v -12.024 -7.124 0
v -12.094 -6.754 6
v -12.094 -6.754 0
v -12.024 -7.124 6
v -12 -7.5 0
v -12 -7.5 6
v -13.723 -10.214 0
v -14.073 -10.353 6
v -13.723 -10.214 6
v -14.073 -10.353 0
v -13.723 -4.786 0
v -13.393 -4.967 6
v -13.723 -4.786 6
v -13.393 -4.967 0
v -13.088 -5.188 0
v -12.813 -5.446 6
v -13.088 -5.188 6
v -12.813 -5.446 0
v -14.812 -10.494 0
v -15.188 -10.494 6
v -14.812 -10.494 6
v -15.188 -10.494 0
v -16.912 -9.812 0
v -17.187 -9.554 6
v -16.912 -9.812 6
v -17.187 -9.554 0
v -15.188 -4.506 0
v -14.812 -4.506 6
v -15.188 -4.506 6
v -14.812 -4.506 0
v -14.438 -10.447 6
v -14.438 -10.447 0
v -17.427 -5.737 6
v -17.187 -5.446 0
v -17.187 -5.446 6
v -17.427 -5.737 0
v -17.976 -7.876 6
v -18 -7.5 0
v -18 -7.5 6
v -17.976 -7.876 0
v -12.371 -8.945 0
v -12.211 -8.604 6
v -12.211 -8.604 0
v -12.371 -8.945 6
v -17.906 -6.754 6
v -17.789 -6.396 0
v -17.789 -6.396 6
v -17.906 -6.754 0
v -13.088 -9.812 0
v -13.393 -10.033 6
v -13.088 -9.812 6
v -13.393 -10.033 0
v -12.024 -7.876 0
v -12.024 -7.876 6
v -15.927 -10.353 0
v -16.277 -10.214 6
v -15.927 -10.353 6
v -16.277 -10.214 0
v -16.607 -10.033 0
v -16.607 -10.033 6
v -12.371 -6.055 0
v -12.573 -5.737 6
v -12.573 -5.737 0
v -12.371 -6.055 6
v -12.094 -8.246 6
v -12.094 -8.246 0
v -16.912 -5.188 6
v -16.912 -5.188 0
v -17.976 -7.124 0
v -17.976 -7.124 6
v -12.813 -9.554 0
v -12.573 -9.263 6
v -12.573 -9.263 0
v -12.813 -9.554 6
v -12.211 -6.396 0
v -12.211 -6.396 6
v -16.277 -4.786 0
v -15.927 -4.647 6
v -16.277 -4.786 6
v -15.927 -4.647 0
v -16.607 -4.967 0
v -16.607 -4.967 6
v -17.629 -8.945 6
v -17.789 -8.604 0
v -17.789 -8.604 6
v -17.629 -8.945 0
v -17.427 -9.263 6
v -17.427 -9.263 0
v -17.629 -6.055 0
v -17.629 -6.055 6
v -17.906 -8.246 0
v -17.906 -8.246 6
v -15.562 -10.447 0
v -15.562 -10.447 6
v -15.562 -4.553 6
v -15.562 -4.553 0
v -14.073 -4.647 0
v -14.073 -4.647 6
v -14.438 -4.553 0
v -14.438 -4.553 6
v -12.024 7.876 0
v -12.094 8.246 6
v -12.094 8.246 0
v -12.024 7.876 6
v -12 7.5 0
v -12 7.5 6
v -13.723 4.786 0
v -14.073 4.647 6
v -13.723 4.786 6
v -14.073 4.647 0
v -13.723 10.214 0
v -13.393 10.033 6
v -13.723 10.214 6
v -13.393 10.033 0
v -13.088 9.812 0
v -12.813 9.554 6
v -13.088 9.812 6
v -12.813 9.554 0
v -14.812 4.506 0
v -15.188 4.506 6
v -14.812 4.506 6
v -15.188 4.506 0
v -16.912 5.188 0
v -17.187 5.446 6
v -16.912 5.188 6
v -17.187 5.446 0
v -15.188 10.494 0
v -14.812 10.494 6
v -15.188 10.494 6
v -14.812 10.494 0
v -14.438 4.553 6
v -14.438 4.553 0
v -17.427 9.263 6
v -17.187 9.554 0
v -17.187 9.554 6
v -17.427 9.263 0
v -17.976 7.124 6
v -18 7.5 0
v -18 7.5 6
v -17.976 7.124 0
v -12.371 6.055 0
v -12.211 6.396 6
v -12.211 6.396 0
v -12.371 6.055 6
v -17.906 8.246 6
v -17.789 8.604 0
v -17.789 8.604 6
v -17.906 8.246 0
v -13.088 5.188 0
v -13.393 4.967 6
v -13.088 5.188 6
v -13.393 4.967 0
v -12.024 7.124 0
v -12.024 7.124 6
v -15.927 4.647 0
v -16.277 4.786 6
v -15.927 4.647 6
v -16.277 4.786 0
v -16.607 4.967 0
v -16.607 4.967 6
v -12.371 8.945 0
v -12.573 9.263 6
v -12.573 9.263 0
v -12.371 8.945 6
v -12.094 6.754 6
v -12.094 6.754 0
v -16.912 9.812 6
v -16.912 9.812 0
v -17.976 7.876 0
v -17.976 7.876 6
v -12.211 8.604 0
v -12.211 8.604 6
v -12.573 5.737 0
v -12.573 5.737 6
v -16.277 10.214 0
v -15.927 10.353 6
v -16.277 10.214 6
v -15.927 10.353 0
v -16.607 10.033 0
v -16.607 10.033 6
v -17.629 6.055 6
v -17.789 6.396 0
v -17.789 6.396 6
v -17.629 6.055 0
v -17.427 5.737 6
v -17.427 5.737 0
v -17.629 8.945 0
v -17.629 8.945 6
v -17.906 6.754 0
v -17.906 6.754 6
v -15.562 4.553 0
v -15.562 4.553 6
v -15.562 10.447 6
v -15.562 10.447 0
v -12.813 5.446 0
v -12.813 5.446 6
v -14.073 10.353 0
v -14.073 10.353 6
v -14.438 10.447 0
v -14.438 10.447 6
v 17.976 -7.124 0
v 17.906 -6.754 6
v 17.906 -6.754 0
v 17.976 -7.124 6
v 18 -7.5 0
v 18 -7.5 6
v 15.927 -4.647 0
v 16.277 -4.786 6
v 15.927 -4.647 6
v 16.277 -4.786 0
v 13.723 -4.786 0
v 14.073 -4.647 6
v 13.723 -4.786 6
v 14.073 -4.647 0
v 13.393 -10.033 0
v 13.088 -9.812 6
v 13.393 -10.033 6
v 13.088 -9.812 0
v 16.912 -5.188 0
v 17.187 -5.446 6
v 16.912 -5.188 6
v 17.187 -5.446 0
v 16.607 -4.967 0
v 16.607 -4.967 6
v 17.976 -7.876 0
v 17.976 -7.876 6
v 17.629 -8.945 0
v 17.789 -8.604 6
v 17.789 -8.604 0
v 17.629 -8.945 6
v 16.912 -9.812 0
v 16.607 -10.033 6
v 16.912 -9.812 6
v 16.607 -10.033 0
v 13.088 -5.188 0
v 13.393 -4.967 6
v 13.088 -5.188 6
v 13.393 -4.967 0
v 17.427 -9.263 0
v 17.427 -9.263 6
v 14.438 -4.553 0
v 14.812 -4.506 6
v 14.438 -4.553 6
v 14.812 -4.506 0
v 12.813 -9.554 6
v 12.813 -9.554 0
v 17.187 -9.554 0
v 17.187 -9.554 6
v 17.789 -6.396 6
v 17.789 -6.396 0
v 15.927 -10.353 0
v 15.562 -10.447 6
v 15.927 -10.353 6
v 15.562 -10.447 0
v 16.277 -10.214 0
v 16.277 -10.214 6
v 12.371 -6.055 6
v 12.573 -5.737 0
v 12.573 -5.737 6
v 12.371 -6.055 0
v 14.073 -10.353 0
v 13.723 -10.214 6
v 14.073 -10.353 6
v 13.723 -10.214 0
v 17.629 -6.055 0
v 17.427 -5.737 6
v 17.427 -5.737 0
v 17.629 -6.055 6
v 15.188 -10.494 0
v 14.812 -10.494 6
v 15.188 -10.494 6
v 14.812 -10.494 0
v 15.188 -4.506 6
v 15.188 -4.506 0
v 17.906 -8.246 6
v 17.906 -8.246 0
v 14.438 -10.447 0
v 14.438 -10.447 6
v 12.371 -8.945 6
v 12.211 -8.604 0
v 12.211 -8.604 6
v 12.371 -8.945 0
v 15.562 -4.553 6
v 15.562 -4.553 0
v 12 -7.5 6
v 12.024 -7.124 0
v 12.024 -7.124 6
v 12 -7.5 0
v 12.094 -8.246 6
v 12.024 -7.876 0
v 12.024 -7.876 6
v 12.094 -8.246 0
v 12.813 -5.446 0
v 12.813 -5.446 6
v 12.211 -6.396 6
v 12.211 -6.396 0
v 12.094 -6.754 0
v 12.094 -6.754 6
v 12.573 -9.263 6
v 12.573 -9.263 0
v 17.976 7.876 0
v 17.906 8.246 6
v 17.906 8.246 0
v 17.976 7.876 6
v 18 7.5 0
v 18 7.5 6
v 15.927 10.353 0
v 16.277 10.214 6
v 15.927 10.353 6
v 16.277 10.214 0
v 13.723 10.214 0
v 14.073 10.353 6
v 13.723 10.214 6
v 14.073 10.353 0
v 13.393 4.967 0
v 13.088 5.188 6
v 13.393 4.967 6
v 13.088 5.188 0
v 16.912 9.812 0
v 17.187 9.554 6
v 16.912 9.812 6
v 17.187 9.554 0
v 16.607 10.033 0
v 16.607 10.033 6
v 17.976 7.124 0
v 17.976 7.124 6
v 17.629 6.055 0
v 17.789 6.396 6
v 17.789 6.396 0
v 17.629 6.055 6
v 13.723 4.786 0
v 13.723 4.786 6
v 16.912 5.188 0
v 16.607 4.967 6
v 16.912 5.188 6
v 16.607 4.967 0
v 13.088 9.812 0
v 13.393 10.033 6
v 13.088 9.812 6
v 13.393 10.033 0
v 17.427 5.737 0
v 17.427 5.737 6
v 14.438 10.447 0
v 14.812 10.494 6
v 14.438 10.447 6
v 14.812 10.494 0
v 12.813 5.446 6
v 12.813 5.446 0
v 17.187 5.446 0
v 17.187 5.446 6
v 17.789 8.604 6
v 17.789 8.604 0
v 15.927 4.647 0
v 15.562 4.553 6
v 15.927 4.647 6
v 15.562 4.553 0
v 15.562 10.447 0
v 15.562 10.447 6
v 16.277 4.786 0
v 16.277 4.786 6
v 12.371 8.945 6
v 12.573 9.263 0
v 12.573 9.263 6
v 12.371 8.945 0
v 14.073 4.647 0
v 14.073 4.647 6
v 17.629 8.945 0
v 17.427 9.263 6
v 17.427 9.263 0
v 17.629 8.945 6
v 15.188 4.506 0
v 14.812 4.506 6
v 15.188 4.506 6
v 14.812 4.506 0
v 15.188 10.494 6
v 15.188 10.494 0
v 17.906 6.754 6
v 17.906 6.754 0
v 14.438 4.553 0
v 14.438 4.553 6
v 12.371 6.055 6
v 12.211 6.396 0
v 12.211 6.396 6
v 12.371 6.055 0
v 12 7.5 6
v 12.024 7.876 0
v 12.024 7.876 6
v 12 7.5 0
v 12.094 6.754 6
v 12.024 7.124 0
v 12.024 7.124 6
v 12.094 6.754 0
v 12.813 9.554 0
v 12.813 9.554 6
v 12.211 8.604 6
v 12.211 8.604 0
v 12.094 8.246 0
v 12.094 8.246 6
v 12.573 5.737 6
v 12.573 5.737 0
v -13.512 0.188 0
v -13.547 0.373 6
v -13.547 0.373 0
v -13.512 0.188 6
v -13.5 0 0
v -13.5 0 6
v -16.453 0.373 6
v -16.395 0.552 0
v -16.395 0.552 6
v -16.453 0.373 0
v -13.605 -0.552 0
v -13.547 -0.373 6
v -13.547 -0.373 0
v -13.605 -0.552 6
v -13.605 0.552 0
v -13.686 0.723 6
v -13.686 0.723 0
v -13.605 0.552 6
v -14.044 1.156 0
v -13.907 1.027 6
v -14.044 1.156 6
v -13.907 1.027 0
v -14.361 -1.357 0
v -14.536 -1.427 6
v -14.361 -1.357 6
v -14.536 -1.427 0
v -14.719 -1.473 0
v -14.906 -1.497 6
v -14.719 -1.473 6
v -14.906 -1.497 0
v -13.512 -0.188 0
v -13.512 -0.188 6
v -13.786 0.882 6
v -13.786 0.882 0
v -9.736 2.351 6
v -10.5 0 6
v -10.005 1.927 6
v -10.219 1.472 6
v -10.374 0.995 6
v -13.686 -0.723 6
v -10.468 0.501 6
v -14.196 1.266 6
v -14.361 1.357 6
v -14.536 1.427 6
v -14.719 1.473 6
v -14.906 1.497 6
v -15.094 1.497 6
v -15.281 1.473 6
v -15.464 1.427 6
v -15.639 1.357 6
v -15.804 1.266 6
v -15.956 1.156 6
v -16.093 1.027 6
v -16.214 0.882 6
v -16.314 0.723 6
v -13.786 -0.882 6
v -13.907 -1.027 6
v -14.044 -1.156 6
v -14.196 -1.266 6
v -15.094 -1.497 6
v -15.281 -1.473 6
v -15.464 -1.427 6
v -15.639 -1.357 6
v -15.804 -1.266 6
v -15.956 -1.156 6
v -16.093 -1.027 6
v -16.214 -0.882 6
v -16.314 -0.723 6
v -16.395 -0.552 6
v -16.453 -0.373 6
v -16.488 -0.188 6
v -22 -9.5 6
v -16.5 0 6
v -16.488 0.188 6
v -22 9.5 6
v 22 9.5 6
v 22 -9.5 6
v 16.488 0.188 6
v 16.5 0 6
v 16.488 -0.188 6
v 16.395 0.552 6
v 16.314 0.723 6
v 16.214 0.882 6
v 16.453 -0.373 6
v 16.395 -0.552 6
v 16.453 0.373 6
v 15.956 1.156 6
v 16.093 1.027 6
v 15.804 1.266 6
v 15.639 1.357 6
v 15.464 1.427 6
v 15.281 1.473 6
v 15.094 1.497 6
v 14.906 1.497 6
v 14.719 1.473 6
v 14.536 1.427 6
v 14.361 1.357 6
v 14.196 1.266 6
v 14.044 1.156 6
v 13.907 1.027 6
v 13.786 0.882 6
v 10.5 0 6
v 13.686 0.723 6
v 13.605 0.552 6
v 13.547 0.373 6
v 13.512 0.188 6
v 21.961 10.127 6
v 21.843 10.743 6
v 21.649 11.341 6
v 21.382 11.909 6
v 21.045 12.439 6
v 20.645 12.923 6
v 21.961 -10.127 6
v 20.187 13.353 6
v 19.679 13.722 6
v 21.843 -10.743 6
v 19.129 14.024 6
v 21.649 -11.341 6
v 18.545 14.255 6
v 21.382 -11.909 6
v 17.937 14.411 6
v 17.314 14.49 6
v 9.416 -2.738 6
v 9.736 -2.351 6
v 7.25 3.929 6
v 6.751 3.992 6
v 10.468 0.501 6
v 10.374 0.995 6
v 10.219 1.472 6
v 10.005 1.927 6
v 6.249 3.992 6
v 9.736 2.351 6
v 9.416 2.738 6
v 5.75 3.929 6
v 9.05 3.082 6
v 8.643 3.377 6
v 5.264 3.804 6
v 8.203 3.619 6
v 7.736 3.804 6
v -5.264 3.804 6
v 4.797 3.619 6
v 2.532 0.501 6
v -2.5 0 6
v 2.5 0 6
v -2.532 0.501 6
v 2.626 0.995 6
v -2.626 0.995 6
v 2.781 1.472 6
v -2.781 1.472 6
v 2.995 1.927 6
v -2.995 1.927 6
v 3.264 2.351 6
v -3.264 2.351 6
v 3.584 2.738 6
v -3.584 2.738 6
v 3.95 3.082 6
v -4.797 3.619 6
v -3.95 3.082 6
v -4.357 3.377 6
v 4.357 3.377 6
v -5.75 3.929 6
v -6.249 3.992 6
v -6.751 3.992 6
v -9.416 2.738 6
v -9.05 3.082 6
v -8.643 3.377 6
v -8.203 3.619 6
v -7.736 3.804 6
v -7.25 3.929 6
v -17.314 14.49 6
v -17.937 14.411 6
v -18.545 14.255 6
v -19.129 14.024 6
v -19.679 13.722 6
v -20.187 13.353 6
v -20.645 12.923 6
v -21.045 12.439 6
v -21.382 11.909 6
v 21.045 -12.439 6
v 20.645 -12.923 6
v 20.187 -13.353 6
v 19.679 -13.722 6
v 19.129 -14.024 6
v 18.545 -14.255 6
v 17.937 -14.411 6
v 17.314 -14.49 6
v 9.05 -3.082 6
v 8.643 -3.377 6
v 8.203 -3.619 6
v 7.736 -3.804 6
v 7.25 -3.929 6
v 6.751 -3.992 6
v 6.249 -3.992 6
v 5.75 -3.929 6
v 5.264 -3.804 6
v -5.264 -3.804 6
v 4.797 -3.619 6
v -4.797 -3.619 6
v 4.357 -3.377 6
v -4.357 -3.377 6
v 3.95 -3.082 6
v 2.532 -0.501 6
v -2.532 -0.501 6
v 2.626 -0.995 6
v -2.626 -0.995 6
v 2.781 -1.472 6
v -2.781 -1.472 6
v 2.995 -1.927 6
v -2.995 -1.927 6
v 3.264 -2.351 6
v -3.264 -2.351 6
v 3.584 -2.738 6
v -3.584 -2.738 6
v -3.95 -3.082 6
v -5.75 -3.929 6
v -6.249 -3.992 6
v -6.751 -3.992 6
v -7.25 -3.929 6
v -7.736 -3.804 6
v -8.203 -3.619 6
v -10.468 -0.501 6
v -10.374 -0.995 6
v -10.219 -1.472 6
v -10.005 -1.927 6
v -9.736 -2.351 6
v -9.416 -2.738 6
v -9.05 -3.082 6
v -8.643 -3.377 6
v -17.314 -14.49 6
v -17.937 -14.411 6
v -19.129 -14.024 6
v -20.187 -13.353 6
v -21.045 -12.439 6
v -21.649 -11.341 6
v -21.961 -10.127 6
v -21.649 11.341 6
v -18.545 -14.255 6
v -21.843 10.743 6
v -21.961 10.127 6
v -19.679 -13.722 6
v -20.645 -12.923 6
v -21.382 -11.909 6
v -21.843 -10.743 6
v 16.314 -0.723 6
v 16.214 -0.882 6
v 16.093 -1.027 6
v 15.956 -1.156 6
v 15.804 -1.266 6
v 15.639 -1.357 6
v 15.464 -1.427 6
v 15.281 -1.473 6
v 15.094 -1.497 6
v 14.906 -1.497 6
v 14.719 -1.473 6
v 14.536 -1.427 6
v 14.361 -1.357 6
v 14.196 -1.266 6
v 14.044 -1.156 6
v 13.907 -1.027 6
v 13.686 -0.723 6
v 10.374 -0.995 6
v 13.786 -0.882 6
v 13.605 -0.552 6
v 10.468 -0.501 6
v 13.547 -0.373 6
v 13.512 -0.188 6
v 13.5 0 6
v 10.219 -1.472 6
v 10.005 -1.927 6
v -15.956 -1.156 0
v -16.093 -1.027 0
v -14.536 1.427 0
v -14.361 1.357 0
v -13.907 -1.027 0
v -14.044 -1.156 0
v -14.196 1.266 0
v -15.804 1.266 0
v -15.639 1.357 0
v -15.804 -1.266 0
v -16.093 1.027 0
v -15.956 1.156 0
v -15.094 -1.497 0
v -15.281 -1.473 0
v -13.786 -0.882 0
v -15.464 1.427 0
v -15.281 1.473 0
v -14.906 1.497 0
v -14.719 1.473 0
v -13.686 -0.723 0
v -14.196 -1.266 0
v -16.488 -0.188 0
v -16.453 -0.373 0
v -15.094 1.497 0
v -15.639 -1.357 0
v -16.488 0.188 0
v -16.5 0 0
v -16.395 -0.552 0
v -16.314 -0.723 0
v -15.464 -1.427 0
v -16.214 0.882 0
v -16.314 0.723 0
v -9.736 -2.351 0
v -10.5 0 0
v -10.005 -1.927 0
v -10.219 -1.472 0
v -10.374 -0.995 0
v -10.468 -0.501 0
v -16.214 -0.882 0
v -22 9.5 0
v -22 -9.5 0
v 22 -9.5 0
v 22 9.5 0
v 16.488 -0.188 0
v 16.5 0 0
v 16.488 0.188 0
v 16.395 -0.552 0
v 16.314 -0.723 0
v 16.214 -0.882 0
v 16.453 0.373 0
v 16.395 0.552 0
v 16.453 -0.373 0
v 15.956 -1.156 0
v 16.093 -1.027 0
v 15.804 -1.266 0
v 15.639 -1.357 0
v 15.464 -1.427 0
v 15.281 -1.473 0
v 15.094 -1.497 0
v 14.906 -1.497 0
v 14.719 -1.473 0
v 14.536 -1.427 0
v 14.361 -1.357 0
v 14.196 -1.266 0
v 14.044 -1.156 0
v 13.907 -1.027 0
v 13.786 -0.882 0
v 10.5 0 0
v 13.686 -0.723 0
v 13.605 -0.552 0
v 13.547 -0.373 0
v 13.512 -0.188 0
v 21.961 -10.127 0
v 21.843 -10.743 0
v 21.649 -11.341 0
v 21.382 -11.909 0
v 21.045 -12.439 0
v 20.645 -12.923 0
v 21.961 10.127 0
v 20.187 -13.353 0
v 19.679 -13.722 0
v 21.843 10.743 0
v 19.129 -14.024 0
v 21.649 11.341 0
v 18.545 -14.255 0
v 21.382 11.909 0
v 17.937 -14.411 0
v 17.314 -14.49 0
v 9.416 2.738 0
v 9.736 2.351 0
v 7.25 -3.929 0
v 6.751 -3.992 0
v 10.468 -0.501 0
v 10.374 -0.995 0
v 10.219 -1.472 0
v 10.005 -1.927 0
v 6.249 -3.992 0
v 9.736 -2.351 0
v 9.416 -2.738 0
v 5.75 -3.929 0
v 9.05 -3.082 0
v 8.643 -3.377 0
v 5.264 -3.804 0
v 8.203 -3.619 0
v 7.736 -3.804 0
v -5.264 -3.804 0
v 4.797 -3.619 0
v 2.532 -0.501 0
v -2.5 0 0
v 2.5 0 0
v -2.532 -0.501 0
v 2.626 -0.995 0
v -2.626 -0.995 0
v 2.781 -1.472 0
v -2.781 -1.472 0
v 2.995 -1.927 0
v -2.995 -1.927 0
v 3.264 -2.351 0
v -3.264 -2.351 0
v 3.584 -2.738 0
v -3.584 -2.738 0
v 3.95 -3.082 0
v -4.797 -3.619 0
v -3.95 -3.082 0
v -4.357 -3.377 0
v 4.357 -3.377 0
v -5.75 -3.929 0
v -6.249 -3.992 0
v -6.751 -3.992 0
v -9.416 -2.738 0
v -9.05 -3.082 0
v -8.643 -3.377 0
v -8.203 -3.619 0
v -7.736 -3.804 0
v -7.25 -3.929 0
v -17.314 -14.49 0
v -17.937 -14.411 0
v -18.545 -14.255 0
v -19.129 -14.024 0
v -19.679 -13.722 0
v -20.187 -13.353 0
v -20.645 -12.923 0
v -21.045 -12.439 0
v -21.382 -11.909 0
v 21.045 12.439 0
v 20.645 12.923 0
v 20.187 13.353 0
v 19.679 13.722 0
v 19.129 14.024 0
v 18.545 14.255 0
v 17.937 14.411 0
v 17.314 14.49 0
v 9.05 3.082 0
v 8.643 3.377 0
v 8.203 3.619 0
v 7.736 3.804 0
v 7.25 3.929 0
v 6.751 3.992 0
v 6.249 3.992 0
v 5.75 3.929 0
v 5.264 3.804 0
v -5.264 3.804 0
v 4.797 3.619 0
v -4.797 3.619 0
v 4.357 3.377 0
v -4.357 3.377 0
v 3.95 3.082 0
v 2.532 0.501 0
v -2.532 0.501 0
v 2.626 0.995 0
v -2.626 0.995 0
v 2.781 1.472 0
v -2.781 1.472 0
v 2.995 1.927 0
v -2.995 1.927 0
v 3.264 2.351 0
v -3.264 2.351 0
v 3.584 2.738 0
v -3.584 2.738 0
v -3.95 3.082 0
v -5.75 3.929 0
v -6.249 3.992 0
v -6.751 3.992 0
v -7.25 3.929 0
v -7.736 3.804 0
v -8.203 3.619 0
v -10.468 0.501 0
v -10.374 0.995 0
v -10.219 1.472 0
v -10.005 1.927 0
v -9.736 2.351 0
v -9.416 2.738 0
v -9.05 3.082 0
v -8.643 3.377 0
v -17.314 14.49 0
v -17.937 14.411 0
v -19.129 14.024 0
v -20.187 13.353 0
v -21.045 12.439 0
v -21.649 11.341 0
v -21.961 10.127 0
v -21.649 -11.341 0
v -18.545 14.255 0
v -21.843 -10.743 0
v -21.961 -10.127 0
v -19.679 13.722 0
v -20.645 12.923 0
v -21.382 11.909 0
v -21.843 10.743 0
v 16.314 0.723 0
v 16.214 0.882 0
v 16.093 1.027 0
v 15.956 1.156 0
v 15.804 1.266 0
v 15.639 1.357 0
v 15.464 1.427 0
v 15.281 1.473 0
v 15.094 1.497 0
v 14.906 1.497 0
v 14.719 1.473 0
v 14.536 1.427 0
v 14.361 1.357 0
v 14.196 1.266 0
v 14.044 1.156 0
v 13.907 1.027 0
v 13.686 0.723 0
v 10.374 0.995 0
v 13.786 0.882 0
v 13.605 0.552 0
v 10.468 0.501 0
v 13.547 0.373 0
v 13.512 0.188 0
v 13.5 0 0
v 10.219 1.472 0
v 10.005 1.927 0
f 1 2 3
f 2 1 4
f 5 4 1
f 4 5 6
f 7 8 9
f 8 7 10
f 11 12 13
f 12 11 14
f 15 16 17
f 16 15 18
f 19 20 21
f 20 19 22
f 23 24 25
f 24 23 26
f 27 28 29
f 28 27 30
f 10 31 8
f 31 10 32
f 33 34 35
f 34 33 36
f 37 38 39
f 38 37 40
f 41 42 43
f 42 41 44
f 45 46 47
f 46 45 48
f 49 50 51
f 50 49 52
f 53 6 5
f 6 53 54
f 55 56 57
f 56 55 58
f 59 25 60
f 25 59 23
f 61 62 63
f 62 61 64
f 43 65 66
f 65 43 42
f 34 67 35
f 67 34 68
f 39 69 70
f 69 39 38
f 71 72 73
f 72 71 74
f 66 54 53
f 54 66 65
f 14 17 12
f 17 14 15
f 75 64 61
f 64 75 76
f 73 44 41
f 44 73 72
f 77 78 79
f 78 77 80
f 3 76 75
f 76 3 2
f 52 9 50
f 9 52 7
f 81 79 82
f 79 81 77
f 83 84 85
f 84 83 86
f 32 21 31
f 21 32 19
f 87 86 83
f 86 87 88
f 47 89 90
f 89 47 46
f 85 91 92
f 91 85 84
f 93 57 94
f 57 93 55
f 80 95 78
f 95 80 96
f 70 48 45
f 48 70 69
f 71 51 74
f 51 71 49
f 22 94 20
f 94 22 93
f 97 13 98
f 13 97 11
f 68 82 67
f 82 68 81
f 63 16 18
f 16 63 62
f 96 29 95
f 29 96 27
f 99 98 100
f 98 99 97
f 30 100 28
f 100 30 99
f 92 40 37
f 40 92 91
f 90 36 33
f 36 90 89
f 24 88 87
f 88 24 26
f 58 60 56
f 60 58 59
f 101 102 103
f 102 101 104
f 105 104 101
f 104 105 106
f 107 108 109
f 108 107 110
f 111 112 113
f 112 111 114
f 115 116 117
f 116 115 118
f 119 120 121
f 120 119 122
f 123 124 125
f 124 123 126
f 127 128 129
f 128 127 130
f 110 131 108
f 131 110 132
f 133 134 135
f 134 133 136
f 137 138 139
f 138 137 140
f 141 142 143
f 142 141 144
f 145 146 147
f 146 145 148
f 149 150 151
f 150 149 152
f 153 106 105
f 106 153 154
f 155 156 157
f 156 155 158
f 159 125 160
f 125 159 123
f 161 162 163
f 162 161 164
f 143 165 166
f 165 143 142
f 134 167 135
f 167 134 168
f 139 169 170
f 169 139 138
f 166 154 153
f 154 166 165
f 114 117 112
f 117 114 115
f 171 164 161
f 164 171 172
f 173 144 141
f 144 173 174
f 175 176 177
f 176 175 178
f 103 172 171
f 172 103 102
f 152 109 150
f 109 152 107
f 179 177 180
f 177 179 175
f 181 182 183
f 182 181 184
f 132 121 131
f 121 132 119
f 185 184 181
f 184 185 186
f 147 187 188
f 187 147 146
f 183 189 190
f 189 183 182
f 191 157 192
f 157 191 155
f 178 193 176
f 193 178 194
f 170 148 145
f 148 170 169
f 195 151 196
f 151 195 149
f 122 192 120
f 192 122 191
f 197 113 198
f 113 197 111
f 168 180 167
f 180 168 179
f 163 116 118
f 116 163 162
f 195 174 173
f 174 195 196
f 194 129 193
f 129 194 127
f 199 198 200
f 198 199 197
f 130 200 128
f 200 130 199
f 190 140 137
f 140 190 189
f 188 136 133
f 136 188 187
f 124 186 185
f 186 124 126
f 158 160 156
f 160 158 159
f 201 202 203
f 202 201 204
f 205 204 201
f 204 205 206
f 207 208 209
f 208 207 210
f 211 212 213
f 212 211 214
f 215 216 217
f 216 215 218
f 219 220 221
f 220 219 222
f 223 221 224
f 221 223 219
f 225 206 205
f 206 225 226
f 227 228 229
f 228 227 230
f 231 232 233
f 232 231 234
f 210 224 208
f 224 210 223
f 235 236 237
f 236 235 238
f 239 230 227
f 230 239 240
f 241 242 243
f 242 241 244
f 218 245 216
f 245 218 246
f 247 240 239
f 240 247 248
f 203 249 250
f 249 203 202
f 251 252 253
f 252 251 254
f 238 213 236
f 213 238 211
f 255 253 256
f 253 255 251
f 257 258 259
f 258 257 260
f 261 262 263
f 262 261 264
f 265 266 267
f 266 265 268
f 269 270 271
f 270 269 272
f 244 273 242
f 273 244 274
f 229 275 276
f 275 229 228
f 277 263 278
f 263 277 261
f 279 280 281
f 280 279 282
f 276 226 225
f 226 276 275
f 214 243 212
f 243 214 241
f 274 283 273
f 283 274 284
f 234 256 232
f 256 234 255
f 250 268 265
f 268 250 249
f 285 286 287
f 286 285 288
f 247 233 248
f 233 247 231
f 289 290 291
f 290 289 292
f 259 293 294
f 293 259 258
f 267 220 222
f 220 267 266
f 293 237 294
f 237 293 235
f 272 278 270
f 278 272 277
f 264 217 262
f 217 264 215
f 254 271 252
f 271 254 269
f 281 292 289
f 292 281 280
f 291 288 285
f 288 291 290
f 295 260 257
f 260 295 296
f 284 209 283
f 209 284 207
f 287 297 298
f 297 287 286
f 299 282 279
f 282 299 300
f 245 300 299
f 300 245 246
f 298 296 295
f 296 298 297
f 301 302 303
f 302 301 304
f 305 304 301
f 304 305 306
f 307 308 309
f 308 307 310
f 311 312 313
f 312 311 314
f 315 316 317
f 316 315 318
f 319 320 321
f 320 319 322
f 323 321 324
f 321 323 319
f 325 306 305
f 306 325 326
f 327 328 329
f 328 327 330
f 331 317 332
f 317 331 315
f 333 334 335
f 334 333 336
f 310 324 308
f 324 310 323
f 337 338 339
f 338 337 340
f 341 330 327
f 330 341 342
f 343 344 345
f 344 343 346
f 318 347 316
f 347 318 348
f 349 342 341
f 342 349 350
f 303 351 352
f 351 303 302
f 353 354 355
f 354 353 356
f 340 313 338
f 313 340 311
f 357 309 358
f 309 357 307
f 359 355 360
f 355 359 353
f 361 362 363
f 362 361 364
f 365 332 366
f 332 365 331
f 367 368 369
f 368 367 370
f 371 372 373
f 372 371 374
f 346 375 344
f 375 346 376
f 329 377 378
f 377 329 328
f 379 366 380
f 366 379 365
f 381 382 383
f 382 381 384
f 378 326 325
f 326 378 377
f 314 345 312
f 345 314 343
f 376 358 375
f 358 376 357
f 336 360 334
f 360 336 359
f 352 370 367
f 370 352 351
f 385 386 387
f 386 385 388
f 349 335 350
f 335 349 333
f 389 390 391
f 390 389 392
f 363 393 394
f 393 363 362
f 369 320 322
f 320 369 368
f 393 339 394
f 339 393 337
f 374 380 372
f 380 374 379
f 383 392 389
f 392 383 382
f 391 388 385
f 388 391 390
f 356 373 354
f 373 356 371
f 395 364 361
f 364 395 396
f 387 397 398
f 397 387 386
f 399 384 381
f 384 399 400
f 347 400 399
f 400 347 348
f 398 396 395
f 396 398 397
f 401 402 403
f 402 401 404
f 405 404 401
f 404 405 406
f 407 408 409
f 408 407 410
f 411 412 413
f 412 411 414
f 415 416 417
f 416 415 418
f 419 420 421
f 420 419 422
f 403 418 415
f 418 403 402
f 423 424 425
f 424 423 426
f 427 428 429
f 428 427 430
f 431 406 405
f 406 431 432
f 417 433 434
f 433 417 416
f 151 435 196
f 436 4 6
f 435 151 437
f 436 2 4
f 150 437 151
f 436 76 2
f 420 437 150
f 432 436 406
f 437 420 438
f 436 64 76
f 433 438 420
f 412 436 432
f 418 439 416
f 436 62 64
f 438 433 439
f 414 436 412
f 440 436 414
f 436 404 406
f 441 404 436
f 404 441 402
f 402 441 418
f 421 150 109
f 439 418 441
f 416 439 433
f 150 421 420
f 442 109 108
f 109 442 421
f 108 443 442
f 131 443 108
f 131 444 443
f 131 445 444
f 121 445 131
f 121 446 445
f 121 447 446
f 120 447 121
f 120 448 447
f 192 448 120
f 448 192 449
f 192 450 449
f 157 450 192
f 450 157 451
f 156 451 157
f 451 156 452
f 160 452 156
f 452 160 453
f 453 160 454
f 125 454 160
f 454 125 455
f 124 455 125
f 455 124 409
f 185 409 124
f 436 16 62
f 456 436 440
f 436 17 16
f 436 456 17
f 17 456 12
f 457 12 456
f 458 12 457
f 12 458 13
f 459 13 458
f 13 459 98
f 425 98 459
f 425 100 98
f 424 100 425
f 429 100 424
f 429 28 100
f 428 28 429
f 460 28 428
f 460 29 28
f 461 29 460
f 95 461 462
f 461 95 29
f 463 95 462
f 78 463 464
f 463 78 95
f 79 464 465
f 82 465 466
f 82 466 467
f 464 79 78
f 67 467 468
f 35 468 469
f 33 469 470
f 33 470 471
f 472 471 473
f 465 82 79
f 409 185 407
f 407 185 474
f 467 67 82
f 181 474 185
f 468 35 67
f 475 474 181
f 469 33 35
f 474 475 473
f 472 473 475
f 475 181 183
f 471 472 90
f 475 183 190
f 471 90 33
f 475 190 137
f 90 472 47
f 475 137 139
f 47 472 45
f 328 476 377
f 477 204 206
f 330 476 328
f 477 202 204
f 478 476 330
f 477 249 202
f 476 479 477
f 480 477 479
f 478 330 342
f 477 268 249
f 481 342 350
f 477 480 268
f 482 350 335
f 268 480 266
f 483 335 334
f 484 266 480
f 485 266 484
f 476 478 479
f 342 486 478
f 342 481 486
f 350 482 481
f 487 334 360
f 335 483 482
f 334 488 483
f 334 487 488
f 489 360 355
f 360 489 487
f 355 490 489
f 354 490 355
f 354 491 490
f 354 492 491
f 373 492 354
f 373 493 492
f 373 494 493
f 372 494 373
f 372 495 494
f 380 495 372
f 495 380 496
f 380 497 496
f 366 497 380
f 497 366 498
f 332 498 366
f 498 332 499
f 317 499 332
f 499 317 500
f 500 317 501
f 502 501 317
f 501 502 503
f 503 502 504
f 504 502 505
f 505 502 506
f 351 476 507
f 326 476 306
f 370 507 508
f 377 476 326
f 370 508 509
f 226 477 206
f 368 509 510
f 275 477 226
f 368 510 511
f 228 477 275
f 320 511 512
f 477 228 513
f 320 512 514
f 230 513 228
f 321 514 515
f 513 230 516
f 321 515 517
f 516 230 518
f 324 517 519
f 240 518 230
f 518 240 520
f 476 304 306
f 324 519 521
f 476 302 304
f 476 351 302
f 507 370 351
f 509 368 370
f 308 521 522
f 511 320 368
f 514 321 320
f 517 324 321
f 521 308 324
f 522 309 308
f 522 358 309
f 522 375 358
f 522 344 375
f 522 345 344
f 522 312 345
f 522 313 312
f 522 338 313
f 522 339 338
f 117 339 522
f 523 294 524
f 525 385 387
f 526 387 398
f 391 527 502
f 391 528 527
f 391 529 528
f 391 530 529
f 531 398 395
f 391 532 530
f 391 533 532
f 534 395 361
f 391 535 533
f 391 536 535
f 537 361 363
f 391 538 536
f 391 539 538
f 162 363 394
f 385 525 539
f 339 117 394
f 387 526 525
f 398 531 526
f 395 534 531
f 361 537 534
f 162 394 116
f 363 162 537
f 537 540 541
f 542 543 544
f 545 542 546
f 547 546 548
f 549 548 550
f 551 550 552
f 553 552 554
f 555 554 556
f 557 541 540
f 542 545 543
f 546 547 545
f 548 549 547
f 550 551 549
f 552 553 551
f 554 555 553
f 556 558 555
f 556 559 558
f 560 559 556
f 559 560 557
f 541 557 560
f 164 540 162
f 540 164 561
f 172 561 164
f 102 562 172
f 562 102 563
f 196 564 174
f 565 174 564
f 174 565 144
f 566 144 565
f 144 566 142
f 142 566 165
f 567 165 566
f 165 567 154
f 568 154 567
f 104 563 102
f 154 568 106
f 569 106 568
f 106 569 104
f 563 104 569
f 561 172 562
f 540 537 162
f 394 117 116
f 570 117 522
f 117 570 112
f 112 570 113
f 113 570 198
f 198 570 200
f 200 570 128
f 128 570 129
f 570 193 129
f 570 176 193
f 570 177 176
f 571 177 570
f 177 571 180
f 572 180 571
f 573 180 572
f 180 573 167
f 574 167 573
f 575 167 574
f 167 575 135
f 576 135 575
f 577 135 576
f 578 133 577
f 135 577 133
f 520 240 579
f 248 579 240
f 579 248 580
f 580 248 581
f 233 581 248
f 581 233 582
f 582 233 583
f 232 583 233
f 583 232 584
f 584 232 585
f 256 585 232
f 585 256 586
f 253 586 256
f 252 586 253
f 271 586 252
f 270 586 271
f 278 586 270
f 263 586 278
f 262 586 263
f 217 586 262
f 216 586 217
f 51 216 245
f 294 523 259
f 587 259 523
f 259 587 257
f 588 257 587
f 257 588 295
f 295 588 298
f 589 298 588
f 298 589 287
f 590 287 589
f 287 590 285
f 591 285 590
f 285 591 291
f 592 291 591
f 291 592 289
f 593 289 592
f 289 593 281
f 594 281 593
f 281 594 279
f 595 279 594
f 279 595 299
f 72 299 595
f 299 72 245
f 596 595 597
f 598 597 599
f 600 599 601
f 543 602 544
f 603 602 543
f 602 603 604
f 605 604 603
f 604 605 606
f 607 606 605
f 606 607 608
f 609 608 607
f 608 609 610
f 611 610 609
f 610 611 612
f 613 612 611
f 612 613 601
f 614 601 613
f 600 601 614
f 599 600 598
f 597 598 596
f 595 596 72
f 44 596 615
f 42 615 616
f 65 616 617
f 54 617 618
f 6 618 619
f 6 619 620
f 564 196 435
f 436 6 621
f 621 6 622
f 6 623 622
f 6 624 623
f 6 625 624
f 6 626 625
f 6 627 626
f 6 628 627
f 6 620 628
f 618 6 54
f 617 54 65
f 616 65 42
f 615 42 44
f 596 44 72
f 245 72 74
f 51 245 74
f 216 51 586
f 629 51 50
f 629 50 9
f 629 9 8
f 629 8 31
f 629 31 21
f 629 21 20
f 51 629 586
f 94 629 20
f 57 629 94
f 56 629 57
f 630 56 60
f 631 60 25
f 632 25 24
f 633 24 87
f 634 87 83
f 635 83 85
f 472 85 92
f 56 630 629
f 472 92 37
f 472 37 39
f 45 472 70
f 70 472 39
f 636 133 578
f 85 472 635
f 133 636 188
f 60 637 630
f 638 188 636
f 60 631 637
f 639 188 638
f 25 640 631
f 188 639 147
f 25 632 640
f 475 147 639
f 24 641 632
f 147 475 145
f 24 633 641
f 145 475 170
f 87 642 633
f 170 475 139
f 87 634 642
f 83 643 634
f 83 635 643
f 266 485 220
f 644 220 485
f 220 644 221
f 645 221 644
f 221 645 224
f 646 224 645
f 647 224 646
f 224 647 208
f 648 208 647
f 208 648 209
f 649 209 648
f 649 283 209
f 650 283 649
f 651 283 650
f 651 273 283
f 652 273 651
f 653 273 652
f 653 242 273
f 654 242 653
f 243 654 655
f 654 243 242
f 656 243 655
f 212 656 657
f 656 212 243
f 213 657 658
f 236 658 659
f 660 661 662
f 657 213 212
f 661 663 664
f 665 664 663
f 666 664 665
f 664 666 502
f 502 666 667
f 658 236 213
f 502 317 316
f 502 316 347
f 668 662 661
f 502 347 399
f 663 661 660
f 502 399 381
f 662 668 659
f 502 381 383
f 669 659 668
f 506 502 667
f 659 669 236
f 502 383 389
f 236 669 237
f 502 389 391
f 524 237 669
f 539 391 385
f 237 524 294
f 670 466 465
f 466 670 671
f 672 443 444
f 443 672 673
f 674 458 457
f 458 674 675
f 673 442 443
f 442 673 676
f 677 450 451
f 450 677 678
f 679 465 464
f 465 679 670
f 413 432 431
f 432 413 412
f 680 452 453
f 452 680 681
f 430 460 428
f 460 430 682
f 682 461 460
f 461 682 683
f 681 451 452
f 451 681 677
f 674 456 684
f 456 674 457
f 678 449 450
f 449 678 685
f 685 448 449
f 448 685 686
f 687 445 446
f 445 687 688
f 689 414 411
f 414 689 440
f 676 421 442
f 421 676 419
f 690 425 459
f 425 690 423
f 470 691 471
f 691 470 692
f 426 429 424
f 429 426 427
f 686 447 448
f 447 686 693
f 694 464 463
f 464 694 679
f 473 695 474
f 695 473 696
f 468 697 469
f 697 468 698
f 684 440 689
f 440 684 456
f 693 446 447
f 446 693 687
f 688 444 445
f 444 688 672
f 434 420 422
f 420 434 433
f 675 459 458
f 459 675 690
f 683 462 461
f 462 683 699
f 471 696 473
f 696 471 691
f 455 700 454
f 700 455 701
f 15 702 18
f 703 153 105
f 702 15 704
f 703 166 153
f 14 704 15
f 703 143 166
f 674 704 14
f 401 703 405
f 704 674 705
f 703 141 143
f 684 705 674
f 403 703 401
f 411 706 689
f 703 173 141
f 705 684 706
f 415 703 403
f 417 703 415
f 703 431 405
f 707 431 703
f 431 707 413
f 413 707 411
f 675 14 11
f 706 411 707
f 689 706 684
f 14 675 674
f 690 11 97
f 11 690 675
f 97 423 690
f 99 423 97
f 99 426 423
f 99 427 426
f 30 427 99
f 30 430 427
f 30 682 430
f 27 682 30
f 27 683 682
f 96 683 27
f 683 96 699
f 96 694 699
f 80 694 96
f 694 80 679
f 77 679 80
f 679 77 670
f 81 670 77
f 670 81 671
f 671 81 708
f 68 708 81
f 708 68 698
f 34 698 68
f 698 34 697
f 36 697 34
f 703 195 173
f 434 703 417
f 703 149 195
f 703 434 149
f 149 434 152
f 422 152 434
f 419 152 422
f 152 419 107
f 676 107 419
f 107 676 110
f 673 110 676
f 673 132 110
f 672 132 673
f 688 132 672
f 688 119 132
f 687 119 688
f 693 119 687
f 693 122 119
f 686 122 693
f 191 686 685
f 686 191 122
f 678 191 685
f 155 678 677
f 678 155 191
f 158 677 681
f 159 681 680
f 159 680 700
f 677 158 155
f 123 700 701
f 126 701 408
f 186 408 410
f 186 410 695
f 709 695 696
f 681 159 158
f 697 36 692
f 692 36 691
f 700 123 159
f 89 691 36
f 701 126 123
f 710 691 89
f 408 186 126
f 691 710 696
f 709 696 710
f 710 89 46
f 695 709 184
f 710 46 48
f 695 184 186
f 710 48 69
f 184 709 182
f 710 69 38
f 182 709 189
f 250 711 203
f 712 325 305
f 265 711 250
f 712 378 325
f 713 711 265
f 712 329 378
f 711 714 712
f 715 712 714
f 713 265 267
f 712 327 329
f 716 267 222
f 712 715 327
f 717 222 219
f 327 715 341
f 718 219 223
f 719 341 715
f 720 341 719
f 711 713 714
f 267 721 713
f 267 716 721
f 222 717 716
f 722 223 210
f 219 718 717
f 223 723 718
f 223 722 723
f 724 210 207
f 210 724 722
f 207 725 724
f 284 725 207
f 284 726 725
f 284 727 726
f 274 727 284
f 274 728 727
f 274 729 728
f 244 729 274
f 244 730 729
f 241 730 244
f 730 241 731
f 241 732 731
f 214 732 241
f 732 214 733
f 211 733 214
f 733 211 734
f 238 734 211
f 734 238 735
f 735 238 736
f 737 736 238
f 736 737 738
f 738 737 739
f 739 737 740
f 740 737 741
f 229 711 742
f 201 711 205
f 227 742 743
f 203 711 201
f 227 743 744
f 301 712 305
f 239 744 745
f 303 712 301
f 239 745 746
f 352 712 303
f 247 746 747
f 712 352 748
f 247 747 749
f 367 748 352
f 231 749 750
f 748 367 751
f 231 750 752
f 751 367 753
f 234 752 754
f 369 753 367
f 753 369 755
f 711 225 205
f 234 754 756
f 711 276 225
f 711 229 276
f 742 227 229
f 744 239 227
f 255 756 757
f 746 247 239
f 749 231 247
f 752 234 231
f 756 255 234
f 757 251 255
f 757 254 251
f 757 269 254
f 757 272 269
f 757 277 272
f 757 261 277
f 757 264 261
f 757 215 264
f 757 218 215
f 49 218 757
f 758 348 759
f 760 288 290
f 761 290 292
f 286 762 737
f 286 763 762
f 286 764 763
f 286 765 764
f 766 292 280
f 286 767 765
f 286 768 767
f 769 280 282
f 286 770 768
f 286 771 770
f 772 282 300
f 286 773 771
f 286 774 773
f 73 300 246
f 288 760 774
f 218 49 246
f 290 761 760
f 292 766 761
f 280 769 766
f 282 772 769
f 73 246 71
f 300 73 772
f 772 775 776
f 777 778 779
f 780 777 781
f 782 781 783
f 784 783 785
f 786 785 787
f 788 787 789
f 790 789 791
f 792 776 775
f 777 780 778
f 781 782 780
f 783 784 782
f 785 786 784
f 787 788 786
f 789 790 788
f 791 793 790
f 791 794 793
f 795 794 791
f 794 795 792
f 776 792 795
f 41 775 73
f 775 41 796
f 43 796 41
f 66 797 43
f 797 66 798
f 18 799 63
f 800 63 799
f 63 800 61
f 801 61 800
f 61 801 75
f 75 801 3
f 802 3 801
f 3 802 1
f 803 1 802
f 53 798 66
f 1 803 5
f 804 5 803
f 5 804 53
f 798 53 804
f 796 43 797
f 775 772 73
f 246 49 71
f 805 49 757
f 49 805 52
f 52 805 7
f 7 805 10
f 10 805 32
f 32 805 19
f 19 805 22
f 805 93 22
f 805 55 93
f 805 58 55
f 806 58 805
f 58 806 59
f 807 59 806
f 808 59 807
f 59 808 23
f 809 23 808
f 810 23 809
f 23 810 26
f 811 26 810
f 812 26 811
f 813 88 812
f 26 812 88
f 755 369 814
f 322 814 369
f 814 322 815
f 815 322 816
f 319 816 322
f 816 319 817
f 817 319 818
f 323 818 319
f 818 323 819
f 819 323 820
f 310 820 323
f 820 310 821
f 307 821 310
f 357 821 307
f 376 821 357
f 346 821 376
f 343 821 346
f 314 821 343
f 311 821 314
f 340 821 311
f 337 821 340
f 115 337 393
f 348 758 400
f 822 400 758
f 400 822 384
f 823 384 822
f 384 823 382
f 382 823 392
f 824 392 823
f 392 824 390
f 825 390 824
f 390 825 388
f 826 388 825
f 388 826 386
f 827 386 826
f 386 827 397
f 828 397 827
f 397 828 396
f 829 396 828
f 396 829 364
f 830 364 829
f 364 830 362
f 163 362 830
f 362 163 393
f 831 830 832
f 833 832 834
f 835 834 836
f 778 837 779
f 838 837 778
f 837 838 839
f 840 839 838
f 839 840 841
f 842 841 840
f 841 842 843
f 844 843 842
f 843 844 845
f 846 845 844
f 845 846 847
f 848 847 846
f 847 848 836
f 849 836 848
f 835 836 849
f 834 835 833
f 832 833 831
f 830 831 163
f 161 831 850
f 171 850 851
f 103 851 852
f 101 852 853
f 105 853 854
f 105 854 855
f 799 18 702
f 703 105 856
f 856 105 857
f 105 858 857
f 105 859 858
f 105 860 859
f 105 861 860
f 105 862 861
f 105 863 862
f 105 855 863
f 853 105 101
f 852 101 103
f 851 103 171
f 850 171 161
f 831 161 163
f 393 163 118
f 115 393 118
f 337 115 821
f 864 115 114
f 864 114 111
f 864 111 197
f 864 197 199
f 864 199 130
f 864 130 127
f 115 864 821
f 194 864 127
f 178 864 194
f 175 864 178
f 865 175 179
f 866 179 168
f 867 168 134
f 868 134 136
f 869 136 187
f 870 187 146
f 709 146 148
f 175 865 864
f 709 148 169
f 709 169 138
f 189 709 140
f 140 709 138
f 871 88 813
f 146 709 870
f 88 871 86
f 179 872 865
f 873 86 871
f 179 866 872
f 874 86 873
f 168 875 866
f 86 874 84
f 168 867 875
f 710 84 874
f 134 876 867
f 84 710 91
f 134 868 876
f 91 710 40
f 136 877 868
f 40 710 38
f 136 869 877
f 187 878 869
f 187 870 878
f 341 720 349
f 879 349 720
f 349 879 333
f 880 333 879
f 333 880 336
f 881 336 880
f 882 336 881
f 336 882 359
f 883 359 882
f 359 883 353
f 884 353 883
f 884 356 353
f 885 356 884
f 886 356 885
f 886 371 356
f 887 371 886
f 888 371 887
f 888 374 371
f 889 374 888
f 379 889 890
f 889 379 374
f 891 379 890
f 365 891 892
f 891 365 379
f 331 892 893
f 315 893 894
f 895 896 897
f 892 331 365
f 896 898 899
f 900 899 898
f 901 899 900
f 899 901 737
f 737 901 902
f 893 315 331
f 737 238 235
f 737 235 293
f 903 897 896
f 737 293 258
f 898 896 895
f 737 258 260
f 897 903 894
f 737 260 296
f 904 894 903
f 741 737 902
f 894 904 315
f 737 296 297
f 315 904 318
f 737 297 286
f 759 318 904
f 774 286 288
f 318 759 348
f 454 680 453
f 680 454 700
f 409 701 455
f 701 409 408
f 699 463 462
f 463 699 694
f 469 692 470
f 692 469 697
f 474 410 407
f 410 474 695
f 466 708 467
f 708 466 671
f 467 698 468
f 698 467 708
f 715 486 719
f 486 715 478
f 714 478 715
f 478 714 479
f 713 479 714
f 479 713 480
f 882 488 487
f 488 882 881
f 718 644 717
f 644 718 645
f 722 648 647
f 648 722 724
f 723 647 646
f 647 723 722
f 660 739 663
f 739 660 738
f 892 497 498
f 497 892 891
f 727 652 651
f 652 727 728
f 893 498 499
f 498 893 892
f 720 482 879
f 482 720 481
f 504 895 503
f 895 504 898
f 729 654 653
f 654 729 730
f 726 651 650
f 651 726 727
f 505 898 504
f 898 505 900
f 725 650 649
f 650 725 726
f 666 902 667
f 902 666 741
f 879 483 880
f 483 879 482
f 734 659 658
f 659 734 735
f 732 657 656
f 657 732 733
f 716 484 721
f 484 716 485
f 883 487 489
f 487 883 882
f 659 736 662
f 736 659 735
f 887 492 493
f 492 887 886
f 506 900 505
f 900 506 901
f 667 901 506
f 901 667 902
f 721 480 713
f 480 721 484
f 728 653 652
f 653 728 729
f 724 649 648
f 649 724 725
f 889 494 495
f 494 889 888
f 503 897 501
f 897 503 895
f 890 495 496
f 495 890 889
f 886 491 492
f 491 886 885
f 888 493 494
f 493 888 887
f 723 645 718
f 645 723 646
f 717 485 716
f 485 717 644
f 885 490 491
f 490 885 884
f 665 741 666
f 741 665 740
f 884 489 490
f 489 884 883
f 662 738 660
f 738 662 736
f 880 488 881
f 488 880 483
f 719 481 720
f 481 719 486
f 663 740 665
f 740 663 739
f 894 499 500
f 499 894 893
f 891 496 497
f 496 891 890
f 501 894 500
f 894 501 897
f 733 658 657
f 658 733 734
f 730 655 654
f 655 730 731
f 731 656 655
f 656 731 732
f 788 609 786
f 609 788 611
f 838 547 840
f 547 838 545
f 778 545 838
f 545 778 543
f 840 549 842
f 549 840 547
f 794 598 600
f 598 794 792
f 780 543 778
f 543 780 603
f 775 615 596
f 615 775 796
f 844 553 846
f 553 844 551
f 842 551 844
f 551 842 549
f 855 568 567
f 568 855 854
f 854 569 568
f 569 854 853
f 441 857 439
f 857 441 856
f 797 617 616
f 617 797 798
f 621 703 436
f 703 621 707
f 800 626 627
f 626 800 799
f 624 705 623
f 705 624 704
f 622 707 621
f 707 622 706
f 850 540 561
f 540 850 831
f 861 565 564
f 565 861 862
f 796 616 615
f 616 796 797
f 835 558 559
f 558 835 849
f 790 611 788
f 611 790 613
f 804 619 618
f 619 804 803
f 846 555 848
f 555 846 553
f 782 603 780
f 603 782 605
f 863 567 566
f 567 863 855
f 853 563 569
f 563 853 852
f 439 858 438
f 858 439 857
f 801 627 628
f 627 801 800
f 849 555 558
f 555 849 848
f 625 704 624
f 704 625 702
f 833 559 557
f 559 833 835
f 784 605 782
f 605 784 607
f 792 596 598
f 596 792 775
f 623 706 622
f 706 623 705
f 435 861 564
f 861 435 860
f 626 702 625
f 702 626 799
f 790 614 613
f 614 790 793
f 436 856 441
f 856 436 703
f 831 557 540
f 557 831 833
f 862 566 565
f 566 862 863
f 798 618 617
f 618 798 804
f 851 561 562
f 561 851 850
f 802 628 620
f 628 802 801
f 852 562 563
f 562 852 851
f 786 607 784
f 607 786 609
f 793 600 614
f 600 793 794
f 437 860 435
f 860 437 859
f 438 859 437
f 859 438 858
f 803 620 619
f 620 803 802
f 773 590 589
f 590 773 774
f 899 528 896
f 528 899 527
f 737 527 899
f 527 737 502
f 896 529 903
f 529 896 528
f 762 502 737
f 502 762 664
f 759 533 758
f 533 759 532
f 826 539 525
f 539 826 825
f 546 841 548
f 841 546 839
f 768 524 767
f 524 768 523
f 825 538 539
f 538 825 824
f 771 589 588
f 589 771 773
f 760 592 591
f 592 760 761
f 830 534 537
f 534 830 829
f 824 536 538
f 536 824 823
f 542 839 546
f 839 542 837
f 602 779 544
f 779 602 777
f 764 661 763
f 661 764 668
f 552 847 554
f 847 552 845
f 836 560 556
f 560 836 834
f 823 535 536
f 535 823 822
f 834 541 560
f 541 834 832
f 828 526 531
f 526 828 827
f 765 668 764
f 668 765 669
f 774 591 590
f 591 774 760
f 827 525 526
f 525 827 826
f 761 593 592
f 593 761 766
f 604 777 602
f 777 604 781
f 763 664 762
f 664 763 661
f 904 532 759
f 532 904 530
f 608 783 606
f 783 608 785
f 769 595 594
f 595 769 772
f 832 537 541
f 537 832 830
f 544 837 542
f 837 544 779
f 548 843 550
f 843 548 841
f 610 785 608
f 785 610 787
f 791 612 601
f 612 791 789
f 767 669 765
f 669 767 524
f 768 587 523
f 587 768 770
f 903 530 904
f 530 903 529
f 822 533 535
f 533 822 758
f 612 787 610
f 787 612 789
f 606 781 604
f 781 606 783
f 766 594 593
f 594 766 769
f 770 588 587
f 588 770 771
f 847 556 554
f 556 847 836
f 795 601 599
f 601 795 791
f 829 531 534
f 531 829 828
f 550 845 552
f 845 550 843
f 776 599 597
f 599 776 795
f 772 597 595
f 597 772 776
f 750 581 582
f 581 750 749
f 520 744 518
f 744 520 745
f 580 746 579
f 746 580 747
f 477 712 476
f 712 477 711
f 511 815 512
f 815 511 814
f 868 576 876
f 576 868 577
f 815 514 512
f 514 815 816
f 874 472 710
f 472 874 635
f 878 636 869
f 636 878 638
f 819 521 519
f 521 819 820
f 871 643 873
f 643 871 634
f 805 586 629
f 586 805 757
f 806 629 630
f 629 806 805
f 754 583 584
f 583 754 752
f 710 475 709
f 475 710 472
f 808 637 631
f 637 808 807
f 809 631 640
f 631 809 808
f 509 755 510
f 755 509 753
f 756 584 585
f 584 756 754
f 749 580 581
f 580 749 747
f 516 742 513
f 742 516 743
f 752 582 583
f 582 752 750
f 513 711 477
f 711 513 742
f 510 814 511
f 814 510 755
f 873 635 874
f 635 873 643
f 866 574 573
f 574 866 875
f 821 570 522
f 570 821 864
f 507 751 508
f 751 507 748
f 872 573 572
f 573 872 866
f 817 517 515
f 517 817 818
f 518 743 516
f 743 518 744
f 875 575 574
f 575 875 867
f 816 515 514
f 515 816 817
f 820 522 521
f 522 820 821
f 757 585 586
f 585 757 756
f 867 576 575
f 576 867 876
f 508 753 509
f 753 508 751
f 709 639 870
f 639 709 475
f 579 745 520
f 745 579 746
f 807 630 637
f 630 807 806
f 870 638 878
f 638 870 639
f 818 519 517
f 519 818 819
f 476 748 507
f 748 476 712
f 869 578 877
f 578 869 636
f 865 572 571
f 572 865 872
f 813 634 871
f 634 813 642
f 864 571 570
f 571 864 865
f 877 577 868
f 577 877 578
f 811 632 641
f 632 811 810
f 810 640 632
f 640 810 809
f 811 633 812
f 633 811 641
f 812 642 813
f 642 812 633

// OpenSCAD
$fn = 50;


difference() {
	union() {
		hull() {
			translate(v = [-17.0000000000, 9.5000000000, 0]) {
				cylinder(h = 6, r = 5);
			}
			translate(v = [17.0000000000, 9.5000000000, 0]) {
				cylinder(h = 6, r = 5);
			}
			translate(v = [-17.0000000000, -9.5000000000, 0]) {
				cylinder(h = 6, r = 5);
			}
			translate(v = [17.0000000000, -9.5000000000, 0]) {
				cylinder(h = 6, r = 5);
			}
		}
	}
	union() {
		#translate(v = [-15.0000000000, -7.5000000000, 0]) {
			cylinder(h = 6, r = 3.0000000000);
		}
		#translate(v = [-15.0000000000, 7.5000000000, 0]) {
			cylinder(h = 6, r = 3.0000000000);
		}
		#translate(v = [15.0000000000, -7.5000000000, 0]) {
			cylinder(h = 6, r = 3.0000000000);
		}
		#translate(v = [15.0000000000, 7.5000000000, 0]) {
			cylinder(h = 6, r = 3.0000000000);
		}
		#translate(v = [-15.0000000000, -7.5000000000, -100.0000000000]) {
			cylinder(h = 200, r = 3.0000000000);
		}
		#translate(v = [-15.0000000000, 7.5000000000, -100.0000000000]) {
			cylinder(h = 200, r = 3.0000000000);
		}
		#translate(v = [15.0000000000, -7.5000000000, -100.0000000000]) {
			cylinder(h = 200, r = 3.0000000000);
		}
		#translate(v = [15.0000000000, 7.5000000000, -100.0000000000]) {
			cylinder(h = 200, r = 3.0000000000);
		}
		#translate(v = [-15.0000000000, -7.5000000000, 0]) {
			cylinder(h = 6, r = 1.5000000000);
		}
		#translate(v = [-15.0000000000, 0.0000000000, 0]) {
			cylinder(h = 6, r = 1.5000000000);
		}
		#translate(v = [-15.0000000000, 7.5000000000, 0]) {
			cylinder(h = 6, r = 1.5000000000);
		}
		#translate(v = [15.0000000000, -7.5000000000, 0]) {
			cylinder(h = 6, r = 1.5000000000);
		}
		#translate(v = [15.0000000000, 0.0000000000, 0]) {
			cylinder(h = 6, r = 1.5000000000);
		}
		#translate(v = [15.0000000000, 7.5000000000, 0]) {
			cylinder(h = 6, r = 1.5000000000);
		}
		#translate(v = [-15.0000000000, -7.5000000000, 0]) {
			cylinder(h = 6, r = 1.5000000000);
		}
		#translate(v = [-15.0000000000, 0.0000000000, 0]) {
			cylinder(h = 6, r = 1.5000000000);
		}
		#translate(v = [-15.0000000000, 7.5000000000, 0]) {
			cylinder(h = 6, r = 1.5000000000);
		}
		#translate(v = [15.0000000000, -7.5000000000, 0]) {
			cylinder(h = 6, r = 1.5000000000);
		}
		#translate(v = [15.0000000000, 0.0000000000, 0]) {
			cylinder(h = 6, r = 1.5000000000);
		}
		#translate(v = [15.0000000000, 7.5000000000, 0]) {
			cylinder(h = 6, r = 1.5000000000);
		}
		#translate(v = [-15.0000000000, -7.5000000000, 0]) {
			cylinder(h = 6, r = 1.5000000000);
		}
		#translate(v = [-15.0000000000, 0.0000000000, 0]) {
			cylinder(h = 6, r = 1.5000000000);
		}
		#translate(v = [-15.0000000000, 7.5000000000, 0]) {
			cylinder(h = 6, r = 1.5000000000);
		}
		#translate(v = [15.0000000000, -7.5000000000, 0]) {
			cylinder(h = 6, r = 1.5000000000);
		}
		#translate(v = [15.0000000000, 0.0000000000, 0]) {
			cylinder(h = 6, r = 1.5000000000);
		}
		#translate(v = [15.0000000000, 7.5000000000, 0]) {
			cylinder(h = 6, r = 1.5000000000);
		}
		#translate(v = [-6.5000000000, 0, 0]) {
			cylinder(h = 6, r = 4.0000000000);
		}
		#translate(v = [6.5000000000, 0, 0]) {
			cylinder(h = 6, r = 4.0000000000);
		}
	}
}
